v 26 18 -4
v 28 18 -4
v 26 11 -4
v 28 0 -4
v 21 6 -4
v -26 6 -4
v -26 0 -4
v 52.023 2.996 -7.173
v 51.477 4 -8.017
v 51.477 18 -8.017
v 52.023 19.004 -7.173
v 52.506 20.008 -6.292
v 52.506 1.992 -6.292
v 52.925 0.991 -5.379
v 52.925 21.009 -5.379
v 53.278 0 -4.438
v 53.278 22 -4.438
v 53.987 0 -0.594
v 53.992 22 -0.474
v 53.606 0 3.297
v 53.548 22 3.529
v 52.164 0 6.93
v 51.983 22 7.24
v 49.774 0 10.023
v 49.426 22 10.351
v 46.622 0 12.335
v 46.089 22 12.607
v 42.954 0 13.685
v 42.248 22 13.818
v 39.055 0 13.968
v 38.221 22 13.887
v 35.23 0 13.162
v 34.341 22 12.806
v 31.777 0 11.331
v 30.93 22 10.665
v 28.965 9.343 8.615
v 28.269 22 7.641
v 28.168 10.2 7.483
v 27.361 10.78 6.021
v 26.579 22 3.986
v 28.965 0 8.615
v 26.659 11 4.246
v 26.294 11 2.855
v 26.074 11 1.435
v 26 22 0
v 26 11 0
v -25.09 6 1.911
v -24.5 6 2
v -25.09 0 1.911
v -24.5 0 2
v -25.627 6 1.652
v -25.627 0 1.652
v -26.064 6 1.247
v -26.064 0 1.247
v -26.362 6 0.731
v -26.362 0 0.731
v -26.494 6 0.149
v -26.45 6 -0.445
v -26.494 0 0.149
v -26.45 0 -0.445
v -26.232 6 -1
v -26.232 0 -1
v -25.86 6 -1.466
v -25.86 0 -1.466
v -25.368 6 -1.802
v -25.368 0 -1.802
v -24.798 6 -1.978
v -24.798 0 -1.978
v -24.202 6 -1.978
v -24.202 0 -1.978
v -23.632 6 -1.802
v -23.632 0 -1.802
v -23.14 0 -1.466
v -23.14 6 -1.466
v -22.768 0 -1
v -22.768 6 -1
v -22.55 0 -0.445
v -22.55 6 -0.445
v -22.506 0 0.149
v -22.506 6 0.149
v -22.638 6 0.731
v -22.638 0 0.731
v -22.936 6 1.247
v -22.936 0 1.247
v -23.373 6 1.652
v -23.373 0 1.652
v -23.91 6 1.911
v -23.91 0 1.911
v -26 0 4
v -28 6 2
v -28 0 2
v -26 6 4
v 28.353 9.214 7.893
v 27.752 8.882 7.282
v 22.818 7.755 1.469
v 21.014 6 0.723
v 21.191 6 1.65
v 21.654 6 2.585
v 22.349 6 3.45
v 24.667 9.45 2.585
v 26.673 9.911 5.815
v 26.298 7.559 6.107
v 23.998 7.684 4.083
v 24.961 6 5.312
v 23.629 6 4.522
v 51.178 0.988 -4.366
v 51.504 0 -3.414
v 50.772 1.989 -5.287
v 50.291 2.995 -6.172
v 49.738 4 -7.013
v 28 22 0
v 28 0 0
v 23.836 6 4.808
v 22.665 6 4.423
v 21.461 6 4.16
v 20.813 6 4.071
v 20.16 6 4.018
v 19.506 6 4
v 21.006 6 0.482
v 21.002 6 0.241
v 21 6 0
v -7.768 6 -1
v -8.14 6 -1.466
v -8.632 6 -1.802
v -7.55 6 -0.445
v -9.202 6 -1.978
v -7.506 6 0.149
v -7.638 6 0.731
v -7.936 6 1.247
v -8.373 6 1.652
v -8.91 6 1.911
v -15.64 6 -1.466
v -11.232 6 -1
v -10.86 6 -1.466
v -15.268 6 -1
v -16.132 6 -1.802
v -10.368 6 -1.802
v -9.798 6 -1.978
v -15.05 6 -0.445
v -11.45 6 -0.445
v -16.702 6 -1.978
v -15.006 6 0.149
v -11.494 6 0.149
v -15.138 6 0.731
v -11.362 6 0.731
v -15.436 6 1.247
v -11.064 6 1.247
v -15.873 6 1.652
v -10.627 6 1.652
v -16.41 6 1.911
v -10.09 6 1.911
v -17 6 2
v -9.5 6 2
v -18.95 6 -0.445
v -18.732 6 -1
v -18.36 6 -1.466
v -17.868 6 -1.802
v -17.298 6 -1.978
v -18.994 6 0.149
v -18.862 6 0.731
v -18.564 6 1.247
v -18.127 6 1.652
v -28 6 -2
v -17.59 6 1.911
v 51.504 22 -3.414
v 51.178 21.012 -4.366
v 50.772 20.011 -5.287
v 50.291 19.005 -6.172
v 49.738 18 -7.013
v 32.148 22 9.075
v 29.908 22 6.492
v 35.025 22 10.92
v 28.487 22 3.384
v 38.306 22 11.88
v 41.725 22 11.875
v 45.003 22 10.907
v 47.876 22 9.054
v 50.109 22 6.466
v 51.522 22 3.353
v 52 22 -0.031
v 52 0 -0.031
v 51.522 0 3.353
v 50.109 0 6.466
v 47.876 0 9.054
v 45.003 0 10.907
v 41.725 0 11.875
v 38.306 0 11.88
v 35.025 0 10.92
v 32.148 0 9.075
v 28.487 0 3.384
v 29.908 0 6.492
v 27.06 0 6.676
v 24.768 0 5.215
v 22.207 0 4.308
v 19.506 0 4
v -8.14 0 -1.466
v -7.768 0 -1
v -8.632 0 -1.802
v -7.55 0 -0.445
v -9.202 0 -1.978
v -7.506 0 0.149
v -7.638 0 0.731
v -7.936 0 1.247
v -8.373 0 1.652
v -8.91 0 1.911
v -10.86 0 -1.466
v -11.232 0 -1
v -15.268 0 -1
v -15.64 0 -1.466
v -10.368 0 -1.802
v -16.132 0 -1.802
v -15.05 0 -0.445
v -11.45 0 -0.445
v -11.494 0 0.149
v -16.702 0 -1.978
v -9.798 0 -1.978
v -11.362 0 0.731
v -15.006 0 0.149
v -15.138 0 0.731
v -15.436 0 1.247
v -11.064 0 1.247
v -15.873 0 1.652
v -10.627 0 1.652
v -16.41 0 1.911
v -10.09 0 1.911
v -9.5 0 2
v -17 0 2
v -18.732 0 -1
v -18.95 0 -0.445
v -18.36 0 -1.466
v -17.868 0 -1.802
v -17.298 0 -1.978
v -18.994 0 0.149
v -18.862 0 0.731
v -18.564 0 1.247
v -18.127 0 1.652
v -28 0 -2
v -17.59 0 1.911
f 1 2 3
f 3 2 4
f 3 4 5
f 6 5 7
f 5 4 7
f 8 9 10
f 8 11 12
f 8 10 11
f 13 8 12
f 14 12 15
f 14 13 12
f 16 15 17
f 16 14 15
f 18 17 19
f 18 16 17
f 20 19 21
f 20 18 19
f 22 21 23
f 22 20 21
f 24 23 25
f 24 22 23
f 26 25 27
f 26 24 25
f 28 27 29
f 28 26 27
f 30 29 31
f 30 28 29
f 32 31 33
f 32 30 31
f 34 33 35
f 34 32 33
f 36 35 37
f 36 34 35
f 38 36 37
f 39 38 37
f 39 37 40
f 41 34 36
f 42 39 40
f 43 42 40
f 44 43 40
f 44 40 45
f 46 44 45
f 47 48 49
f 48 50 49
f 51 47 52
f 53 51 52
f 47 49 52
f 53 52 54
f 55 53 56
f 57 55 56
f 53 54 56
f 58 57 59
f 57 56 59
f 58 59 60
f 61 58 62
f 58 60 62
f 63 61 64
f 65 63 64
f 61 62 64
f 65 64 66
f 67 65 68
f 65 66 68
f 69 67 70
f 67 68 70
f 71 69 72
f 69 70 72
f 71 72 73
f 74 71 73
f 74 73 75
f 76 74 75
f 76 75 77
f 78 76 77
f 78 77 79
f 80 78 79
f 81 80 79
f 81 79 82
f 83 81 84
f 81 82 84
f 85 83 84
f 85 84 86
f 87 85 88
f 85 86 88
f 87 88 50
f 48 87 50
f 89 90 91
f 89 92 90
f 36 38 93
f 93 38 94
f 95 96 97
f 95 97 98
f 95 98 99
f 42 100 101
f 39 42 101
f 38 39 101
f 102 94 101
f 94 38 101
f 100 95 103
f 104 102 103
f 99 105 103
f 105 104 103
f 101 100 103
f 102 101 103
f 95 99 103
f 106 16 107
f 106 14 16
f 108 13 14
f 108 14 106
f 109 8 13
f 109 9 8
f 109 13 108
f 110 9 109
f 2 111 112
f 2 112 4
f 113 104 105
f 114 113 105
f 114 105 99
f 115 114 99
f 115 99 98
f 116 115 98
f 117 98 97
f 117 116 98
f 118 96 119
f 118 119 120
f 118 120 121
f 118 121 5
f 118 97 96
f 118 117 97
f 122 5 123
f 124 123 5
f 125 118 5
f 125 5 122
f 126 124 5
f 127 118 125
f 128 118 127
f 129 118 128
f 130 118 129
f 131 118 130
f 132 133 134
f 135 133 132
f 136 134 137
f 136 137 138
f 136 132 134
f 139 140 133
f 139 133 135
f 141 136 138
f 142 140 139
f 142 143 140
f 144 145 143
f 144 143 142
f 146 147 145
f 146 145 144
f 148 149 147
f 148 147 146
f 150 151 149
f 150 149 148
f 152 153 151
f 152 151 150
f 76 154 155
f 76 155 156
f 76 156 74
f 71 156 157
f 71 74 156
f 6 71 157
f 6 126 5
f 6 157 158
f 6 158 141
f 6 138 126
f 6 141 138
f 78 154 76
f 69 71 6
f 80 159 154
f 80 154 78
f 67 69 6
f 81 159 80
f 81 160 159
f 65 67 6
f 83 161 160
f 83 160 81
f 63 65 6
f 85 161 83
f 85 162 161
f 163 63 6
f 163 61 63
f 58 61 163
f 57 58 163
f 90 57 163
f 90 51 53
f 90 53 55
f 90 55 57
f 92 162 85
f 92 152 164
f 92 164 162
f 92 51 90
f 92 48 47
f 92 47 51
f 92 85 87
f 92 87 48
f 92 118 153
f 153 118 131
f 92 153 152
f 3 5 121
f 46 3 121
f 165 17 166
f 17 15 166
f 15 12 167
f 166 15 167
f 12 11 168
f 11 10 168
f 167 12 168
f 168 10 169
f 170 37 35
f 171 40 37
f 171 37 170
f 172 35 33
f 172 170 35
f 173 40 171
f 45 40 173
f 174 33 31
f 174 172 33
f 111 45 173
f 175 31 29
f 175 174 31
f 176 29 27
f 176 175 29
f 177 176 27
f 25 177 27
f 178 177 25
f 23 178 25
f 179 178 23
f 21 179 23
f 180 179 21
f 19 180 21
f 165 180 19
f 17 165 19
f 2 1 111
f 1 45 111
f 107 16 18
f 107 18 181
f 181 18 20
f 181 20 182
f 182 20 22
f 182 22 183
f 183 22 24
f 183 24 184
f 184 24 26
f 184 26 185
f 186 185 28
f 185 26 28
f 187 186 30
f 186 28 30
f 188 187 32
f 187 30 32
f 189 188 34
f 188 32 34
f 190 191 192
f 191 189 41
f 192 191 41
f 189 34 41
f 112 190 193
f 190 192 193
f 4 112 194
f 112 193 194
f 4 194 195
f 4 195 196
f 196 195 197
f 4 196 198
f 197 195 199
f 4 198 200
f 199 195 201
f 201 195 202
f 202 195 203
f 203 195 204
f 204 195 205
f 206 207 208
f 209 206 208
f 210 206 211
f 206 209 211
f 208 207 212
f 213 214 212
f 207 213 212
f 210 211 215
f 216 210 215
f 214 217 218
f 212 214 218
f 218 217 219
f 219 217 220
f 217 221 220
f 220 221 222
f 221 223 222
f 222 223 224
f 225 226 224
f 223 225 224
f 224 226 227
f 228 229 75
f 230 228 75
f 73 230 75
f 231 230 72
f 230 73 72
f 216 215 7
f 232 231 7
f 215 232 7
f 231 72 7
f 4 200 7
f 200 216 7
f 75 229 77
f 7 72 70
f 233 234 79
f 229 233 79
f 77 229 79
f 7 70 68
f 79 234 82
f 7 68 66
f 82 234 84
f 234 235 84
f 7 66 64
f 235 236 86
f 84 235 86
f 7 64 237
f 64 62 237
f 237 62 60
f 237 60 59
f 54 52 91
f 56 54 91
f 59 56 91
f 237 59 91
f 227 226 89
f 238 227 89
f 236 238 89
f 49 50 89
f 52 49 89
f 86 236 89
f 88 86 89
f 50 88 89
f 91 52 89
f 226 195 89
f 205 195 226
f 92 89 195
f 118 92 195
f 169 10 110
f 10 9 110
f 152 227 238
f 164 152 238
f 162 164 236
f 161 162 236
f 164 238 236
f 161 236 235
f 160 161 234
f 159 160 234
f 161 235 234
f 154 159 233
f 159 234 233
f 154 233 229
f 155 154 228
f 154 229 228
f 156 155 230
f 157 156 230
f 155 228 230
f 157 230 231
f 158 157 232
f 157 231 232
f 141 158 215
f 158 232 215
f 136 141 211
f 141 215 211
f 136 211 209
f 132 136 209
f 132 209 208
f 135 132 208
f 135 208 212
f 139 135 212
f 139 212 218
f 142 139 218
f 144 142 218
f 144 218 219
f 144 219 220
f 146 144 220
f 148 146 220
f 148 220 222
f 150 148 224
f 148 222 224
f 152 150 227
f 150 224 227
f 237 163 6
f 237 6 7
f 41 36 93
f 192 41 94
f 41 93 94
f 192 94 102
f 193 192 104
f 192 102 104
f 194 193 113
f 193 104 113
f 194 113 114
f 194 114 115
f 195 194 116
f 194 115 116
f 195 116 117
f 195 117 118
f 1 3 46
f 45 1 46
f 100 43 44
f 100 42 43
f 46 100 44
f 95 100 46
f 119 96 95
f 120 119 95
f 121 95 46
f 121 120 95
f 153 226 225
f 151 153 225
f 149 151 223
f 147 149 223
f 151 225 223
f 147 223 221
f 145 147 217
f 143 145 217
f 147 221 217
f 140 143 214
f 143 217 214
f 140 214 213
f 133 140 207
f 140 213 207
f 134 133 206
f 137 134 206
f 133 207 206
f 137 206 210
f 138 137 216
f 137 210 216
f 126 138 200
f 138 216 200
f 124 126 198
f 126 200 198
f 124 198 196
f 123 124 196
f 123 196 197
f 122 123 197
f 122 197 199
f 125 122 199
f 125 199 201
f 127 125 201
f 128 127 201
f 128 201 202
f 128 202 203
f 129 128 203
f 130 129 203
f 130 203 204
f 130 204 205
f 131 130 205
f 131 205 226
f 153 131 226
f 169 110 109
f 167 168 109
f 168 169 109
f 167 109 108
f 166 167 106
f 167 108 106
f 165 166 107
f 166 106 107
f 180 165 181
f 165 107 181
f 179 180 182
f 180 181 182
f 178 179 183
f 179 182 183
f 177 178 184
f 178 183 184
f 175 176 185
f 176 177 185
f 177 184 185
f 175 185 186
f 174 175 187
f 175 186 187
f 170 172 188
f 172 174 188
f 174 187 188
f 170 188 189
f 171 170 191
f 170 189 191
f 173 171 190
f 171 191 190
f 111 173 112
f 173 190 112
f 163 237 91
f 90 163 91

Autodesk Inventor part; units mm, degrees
ref_plane "YZ Plane" through (0, 0, 0) normal (1, 0, 0) x (0, 1, 0)
ref_plane "XZ Plane" through (0, 0, 0) normal (0, 1, 0) x (-1, 0, 0)
ref_plane "XY Plane" through (0, 0, 0) normal (0, 0, 1) x (1, 0, 0)
sketch "Sketch1" plane through (0, 0, 0) normal (0, 1, 0) x (-1, 0, 0)
  line L0 (28, 4) -> (-28, 4)
  line L1 (-28, 4) -> (-28, -4)
  line L2 (-28, -4) -> (28, -4)
  line L3 (28, -4) -> (28, 4)
  line L4 (28, 4) -> (-28, -4) construction
  line L5 (-28, 4) -> (28, -4) construction
  point P0 (0, 0)
  dimension "d0" = 8
  dimension "d1" = 56
extrude "Extrusion1" add sketch "Sketch1" along normal blind 6
sketch "Sketch2" plane through (0, 6, 0) normal (0, 1, 0) x (1, 0, 0)
  line L0 (28, -4) -> (28, 4) projected
  line L1 (28, 4) -> (-28, 4) projected
  line L2 (-28, 4) -> (-28, -4) projected
  line L3 (-28, -4) -> (28, -4) projected
  point P0 (0, 0)
  point P1 (-17, 0)
  point P2 (-24.5, 0)
  point P3 (-9.5, 0)
  dimension "d4" = 7.5
  dimension "d5" = 11
  dimension "d14" = 7.5
hole "Hole1" at (-17, 6, 0) at (-24.5, 6, 0) at (-9.5, 6, 0) direction (0, -1, 0) diameter 4 end through all
sketch "Sketch3" plane through (0, 6, 0) normal (0, 1, 0) x (1, 0, 0)
  line L0 (28, -4) -> (28, 4) projected
  arc A0 (28, 0) -> (49.7378, 7.0126) centre (40, 0) ccw
  arc A1 (26, 0) -> (51.4773, 8.0169) centre (40, 0) ccw
  line L1 (51.4773, 8.0169) -> (49.7378, 7.0126)
  line L2 (28, 0) -> (28, 4)
  line L3 (28, 4) -> (-28, 4) projected
  line L4 (26, 4) -> (26, 0)
  point P0 (0, 0)
  dimension "d15" = 2
  dimension "d16" = 0
  dimension "d17" = 60
  dimension "d22" = 12
extrude "Extrusion2" add sketch "Sketch3" along normal blind 16 and the other way blind 6
chamfer "Chamfer1" distance 5 angle 45 2 edges at (26, 6, -2) (26.1467, 6, 2.0212)
chamfer "Chamfer2" distance 2 angle 45 2 edges at (-28, 3, 4) (-28, 3, -4)
chamfer "Chamfer3" distance 4 angle 45 3 edges at (27, 22, -4) (50.6076, 22, -7.5147) (50.6076, 0, -7.5147)
fillet "Fillet1" radius 12 1 edges at (26.5836, 3, 4)
fillet "Fillet2" radius 4 1 edges at (24.865, 8.9761, 5.2631)
properties part number "squirrely_leg_front"
